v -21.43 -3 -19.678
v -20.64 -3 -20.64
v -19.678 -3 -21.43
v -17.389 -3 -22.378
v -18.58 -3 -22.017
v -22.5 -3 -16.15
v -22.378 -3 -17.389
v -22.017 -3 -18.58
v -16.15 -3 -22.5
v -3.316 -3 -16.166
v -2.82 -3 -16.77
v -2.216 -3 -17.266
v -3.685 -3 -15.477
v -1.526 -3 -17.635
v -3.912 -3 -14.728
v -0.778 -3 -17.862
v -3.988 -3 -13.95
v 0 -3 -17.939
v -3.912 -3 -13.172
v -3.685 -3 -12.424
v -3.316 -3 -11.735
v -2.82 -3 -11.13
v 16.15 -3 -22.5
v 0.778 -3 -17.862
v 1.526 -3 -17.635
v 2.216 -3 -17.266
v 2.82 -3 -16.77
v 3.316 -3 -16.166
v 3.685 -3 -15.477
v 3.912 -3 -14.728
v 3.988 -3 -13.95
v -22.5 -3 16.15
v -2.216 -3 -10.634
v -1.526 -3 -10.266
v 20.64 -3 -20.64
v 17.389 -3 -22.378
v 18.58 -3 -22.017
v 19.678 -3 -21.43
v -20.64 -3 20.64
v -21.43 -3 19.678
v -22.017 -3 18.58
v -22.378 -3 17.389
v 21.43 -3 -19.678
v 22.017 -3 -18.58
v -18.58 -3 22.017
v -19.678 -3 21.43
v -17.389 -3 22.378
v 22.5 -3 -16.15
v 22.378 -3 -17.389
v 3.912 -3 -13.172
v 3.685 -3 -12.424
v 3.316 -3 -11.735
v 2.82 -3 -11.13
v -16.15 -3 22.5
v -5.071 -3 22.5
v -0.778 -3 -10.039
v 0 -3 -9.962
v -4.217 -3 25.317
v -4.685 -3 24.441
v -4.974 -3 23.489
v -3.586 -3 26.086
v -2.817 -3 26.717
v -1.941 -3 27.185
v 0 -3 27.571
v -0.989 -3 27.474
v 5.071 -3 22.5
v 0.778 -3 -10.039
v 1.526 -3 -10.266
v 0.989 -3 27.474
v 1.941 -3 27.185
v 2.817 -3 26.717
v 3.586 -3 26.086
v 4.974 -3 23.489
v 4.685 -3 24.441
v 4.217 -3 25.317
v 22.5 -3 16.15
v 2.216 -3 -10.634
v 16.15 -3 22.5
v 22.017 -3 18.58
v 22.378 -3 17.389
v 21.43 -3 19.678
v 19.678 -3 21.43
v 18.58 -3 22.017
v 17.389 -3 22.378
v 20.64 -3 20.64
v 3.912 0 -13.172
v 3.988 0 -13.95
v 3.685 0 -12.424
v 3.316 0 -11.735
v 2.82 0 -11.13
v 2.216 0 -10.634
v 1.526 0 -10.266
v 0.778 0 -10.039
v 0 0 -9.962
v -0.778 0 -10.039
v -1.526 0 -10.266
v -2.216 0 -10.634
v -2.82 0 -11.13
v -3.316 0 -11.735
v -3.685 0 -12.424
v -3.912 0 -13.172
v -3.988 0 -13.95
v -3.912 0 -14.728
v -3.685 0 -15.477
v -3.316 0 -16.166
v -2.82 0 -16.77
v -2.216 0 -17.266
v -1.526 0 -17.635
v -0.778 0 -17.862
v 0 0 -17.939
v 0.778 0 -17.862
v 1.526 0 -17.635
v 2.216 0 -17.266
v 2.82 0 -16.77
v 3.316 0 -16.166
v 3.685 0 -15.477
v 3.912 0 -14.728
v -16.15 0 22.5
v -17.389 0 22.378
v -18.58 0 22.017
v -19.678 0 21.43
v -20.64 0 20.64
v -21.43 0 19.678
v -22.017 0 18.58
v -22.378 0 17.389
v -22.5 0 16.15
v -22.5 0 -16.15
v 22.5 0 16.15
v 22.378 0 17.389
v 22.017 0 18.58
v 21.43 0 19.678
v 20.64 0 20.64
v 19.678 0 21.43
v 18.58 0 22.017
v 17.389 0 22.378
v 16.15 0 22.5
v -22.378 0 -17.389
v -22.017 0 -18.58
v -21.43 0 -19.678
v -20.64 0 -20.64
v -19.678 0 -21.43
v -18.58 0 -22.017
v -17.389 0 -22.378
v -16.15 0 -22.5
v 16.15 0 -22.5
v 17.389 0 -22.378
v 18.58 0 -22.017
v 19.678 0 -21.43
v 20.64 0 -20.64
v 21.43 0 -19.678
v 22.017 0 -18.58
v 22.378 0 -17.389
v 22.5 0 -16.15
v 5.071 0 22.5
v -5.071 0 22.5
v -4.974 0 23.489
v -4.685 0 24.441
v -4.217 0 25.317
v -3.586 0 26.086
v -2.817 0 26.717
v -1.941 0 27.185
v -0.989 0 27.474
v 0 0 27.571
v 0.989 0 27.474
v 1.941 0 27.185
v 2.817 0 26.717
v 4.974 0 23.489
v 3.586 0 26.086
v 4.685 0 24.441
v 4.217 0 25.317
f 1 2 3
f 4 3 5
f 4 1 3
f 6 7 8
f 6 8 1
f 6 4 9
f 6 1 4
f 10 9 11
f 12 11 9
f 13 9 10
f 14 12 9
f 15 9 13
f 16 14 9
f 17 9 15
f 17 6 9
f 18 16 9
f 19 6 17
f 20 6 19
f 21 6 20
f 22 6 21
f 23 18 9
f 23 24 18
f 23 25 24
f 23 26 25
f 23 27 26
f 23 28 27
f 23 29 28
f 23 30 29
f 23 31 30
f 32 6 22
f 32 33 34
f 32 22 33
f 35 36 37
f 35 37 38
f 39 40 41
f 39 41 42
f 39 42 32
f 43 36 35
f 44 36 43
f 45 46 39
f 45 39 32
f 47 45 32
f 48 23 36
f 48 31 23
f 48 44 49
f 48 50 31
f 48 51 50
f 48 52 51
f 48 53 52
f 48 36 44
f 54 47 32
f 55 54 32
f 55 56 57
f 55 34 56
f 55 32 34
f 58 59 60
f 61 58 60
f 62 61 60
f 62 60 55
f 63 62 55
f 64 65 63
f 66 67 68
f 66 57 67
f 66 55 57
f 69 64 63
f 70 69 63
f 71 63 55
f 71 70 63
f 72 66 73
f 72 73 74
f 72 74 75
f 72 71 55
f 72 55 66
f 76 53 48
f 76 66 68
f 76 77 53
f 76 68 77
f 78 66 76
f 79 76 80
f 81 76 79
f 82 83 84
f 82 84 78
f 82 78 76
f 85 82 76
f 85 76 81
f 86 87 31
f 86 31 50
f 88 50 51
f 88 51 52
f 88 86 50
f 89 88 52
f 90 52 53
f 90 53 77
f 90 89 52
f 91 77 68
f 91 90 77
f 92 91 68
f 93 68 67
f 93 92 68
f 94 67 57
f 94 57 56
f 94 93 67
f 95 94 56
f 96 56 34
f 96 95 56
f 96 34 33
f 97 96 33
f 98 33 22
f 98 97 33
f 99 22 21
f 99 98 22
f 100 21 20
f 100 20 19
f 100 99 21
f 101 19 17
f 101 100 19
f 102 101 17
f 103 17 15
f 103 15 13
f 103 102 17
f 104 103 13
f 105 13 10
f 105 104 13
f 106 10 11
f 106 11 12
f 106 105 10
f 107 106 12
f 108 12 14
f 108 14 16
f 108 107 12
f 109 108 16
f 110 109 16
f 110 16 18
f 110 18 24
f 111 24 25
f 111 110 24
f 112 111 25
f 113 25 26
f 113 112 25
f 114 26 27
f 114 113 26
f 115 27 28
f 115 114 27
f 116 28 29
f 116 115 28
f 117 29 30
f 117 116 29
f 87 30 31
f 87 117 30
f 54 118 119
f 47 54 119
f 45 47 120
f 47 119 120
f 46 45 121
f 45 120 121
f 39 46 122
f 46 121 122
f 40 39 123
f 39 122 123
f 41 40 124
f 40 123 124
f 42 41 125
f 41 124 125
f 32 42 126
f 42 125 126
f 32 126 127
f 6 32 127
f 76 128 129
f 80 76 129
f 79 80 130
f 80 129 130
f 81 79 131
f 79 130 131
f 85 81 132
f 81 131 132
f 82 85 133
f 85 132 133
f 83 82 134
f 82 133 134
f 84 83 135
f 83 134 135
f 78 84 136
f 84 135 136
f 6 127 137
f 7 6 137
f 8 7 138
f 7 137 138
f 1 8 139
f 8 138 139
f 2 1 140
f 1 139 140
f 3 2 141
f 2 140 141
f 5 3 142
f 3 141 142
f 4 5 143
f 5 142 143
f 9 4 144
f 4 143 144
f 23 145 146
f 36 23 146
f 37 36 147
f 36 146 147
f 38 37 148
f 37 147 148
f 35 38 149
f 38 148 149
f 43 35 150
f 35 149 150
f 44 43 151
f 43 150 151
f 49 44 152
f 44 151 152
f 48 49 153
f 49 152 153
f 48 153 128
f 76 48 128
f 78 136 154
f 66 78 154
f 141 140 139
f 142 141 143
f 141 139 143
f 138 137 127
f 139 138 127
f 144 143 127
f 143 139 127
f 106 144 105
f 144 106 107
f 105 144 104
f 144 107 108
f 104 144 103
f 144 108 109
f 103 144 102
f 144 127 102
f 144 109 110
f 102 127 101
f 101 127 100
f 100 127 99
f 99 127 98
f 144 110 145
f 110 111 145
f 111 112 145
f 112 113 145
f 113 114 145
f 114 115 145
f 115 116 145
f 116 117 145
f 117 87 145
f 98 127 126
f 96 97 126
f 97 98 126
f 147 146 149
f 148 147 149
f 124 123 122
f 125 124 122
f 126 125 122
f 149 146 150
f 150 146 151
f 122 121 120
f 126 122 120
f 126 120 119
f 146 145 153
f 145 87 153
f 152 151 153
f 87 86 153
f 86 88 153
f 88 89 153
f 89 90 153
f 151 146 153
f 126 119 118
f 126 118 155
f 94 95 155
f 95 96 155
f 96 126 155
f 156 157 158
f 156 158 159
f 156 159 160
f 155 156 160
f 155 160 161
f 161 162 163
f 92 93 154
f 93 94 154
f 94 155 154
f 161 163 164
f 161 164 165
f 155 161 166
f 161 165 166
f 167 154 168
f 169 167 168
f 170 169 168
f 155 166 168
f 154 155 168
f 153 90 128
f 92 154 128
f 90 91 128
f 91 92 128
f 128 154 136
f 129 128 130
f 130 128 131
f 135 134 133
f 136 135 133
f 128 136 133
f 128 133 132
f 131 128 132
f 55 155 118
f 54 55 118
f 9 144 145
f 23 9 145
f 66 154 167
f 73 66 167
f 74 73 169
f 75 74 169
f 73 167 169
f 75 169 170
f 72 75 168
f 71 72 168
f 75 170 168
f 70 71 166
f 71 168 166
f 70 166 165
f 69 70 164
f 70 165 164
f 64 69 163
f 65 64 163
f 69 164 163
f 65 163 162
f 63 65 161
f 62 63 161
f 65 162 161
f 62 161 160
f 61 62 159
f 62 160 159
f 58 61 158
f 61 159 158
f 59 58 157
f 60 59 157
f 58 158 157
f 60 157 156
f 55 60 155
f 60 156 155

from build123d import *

# Parameters (mm, degrees)
F0_R     = 3.9882187516
F1_DEPTH = 3


with BuildPart() as f1:
    # F0 (on Front) → F1 (new body)
    with BuildSketch(Plane.XZ):
        with BuildLine():
            ThreePointArc((22.5, 16.15), (20.6401280605, 20.6401280605), (16.15, 22.5))
            Line((16.15, 22.5), (5.0711838848, 22.5))
            ThreePointArc((5.0711838848, 22.5), (0, 17.4288161152), (-5.0711838848, 22.5))
            Line((-5.0711838848, 22.5), (-16.15, 22.5))
            ThreePointArc((-16.15, 22.5), (-20.6401280605, 20.6401280605), (-22.5, 16.15))
            Line((-22.5, 16.15), (-22.5, -16.15))
            ThreePointArc((-22.5, -16.15), (-20.6401280605, -20.6401280605), (-16.15, -22.5))
            Line((-16.15, -22.5), (16.15, -22.5))
            ThreePointArc((16.15, -22.5), (20.6401280605, -20.6401280605), (22.5, -16.15))
            Line((22.5, -16.15), (22.5, 16.15))
        make_face()
        with Locations((0, -13.9503730461)):
            Circle(F0_R, mode=Mode.SUBTRACT)
        with BuildLine():
            Line((-5.0711838848, 22.5), (5.0711838848, 22.5))
            ThreePointArc((5.0711838848, 22.5), (0, 27.5711838848), (-5.0711838848, 22.5))
        make_face()
        with BuildLine():
            ThreePointArc((-5.0711838848, 22.5), (0, 17.4288161152), (5.0711838848, 22.5))
            Line((5.0711838848, 22.5), (-5.0711838848, 22.5))
        make_face()
    extrude(amount=F1_DEPTH)


solid = f1.part
